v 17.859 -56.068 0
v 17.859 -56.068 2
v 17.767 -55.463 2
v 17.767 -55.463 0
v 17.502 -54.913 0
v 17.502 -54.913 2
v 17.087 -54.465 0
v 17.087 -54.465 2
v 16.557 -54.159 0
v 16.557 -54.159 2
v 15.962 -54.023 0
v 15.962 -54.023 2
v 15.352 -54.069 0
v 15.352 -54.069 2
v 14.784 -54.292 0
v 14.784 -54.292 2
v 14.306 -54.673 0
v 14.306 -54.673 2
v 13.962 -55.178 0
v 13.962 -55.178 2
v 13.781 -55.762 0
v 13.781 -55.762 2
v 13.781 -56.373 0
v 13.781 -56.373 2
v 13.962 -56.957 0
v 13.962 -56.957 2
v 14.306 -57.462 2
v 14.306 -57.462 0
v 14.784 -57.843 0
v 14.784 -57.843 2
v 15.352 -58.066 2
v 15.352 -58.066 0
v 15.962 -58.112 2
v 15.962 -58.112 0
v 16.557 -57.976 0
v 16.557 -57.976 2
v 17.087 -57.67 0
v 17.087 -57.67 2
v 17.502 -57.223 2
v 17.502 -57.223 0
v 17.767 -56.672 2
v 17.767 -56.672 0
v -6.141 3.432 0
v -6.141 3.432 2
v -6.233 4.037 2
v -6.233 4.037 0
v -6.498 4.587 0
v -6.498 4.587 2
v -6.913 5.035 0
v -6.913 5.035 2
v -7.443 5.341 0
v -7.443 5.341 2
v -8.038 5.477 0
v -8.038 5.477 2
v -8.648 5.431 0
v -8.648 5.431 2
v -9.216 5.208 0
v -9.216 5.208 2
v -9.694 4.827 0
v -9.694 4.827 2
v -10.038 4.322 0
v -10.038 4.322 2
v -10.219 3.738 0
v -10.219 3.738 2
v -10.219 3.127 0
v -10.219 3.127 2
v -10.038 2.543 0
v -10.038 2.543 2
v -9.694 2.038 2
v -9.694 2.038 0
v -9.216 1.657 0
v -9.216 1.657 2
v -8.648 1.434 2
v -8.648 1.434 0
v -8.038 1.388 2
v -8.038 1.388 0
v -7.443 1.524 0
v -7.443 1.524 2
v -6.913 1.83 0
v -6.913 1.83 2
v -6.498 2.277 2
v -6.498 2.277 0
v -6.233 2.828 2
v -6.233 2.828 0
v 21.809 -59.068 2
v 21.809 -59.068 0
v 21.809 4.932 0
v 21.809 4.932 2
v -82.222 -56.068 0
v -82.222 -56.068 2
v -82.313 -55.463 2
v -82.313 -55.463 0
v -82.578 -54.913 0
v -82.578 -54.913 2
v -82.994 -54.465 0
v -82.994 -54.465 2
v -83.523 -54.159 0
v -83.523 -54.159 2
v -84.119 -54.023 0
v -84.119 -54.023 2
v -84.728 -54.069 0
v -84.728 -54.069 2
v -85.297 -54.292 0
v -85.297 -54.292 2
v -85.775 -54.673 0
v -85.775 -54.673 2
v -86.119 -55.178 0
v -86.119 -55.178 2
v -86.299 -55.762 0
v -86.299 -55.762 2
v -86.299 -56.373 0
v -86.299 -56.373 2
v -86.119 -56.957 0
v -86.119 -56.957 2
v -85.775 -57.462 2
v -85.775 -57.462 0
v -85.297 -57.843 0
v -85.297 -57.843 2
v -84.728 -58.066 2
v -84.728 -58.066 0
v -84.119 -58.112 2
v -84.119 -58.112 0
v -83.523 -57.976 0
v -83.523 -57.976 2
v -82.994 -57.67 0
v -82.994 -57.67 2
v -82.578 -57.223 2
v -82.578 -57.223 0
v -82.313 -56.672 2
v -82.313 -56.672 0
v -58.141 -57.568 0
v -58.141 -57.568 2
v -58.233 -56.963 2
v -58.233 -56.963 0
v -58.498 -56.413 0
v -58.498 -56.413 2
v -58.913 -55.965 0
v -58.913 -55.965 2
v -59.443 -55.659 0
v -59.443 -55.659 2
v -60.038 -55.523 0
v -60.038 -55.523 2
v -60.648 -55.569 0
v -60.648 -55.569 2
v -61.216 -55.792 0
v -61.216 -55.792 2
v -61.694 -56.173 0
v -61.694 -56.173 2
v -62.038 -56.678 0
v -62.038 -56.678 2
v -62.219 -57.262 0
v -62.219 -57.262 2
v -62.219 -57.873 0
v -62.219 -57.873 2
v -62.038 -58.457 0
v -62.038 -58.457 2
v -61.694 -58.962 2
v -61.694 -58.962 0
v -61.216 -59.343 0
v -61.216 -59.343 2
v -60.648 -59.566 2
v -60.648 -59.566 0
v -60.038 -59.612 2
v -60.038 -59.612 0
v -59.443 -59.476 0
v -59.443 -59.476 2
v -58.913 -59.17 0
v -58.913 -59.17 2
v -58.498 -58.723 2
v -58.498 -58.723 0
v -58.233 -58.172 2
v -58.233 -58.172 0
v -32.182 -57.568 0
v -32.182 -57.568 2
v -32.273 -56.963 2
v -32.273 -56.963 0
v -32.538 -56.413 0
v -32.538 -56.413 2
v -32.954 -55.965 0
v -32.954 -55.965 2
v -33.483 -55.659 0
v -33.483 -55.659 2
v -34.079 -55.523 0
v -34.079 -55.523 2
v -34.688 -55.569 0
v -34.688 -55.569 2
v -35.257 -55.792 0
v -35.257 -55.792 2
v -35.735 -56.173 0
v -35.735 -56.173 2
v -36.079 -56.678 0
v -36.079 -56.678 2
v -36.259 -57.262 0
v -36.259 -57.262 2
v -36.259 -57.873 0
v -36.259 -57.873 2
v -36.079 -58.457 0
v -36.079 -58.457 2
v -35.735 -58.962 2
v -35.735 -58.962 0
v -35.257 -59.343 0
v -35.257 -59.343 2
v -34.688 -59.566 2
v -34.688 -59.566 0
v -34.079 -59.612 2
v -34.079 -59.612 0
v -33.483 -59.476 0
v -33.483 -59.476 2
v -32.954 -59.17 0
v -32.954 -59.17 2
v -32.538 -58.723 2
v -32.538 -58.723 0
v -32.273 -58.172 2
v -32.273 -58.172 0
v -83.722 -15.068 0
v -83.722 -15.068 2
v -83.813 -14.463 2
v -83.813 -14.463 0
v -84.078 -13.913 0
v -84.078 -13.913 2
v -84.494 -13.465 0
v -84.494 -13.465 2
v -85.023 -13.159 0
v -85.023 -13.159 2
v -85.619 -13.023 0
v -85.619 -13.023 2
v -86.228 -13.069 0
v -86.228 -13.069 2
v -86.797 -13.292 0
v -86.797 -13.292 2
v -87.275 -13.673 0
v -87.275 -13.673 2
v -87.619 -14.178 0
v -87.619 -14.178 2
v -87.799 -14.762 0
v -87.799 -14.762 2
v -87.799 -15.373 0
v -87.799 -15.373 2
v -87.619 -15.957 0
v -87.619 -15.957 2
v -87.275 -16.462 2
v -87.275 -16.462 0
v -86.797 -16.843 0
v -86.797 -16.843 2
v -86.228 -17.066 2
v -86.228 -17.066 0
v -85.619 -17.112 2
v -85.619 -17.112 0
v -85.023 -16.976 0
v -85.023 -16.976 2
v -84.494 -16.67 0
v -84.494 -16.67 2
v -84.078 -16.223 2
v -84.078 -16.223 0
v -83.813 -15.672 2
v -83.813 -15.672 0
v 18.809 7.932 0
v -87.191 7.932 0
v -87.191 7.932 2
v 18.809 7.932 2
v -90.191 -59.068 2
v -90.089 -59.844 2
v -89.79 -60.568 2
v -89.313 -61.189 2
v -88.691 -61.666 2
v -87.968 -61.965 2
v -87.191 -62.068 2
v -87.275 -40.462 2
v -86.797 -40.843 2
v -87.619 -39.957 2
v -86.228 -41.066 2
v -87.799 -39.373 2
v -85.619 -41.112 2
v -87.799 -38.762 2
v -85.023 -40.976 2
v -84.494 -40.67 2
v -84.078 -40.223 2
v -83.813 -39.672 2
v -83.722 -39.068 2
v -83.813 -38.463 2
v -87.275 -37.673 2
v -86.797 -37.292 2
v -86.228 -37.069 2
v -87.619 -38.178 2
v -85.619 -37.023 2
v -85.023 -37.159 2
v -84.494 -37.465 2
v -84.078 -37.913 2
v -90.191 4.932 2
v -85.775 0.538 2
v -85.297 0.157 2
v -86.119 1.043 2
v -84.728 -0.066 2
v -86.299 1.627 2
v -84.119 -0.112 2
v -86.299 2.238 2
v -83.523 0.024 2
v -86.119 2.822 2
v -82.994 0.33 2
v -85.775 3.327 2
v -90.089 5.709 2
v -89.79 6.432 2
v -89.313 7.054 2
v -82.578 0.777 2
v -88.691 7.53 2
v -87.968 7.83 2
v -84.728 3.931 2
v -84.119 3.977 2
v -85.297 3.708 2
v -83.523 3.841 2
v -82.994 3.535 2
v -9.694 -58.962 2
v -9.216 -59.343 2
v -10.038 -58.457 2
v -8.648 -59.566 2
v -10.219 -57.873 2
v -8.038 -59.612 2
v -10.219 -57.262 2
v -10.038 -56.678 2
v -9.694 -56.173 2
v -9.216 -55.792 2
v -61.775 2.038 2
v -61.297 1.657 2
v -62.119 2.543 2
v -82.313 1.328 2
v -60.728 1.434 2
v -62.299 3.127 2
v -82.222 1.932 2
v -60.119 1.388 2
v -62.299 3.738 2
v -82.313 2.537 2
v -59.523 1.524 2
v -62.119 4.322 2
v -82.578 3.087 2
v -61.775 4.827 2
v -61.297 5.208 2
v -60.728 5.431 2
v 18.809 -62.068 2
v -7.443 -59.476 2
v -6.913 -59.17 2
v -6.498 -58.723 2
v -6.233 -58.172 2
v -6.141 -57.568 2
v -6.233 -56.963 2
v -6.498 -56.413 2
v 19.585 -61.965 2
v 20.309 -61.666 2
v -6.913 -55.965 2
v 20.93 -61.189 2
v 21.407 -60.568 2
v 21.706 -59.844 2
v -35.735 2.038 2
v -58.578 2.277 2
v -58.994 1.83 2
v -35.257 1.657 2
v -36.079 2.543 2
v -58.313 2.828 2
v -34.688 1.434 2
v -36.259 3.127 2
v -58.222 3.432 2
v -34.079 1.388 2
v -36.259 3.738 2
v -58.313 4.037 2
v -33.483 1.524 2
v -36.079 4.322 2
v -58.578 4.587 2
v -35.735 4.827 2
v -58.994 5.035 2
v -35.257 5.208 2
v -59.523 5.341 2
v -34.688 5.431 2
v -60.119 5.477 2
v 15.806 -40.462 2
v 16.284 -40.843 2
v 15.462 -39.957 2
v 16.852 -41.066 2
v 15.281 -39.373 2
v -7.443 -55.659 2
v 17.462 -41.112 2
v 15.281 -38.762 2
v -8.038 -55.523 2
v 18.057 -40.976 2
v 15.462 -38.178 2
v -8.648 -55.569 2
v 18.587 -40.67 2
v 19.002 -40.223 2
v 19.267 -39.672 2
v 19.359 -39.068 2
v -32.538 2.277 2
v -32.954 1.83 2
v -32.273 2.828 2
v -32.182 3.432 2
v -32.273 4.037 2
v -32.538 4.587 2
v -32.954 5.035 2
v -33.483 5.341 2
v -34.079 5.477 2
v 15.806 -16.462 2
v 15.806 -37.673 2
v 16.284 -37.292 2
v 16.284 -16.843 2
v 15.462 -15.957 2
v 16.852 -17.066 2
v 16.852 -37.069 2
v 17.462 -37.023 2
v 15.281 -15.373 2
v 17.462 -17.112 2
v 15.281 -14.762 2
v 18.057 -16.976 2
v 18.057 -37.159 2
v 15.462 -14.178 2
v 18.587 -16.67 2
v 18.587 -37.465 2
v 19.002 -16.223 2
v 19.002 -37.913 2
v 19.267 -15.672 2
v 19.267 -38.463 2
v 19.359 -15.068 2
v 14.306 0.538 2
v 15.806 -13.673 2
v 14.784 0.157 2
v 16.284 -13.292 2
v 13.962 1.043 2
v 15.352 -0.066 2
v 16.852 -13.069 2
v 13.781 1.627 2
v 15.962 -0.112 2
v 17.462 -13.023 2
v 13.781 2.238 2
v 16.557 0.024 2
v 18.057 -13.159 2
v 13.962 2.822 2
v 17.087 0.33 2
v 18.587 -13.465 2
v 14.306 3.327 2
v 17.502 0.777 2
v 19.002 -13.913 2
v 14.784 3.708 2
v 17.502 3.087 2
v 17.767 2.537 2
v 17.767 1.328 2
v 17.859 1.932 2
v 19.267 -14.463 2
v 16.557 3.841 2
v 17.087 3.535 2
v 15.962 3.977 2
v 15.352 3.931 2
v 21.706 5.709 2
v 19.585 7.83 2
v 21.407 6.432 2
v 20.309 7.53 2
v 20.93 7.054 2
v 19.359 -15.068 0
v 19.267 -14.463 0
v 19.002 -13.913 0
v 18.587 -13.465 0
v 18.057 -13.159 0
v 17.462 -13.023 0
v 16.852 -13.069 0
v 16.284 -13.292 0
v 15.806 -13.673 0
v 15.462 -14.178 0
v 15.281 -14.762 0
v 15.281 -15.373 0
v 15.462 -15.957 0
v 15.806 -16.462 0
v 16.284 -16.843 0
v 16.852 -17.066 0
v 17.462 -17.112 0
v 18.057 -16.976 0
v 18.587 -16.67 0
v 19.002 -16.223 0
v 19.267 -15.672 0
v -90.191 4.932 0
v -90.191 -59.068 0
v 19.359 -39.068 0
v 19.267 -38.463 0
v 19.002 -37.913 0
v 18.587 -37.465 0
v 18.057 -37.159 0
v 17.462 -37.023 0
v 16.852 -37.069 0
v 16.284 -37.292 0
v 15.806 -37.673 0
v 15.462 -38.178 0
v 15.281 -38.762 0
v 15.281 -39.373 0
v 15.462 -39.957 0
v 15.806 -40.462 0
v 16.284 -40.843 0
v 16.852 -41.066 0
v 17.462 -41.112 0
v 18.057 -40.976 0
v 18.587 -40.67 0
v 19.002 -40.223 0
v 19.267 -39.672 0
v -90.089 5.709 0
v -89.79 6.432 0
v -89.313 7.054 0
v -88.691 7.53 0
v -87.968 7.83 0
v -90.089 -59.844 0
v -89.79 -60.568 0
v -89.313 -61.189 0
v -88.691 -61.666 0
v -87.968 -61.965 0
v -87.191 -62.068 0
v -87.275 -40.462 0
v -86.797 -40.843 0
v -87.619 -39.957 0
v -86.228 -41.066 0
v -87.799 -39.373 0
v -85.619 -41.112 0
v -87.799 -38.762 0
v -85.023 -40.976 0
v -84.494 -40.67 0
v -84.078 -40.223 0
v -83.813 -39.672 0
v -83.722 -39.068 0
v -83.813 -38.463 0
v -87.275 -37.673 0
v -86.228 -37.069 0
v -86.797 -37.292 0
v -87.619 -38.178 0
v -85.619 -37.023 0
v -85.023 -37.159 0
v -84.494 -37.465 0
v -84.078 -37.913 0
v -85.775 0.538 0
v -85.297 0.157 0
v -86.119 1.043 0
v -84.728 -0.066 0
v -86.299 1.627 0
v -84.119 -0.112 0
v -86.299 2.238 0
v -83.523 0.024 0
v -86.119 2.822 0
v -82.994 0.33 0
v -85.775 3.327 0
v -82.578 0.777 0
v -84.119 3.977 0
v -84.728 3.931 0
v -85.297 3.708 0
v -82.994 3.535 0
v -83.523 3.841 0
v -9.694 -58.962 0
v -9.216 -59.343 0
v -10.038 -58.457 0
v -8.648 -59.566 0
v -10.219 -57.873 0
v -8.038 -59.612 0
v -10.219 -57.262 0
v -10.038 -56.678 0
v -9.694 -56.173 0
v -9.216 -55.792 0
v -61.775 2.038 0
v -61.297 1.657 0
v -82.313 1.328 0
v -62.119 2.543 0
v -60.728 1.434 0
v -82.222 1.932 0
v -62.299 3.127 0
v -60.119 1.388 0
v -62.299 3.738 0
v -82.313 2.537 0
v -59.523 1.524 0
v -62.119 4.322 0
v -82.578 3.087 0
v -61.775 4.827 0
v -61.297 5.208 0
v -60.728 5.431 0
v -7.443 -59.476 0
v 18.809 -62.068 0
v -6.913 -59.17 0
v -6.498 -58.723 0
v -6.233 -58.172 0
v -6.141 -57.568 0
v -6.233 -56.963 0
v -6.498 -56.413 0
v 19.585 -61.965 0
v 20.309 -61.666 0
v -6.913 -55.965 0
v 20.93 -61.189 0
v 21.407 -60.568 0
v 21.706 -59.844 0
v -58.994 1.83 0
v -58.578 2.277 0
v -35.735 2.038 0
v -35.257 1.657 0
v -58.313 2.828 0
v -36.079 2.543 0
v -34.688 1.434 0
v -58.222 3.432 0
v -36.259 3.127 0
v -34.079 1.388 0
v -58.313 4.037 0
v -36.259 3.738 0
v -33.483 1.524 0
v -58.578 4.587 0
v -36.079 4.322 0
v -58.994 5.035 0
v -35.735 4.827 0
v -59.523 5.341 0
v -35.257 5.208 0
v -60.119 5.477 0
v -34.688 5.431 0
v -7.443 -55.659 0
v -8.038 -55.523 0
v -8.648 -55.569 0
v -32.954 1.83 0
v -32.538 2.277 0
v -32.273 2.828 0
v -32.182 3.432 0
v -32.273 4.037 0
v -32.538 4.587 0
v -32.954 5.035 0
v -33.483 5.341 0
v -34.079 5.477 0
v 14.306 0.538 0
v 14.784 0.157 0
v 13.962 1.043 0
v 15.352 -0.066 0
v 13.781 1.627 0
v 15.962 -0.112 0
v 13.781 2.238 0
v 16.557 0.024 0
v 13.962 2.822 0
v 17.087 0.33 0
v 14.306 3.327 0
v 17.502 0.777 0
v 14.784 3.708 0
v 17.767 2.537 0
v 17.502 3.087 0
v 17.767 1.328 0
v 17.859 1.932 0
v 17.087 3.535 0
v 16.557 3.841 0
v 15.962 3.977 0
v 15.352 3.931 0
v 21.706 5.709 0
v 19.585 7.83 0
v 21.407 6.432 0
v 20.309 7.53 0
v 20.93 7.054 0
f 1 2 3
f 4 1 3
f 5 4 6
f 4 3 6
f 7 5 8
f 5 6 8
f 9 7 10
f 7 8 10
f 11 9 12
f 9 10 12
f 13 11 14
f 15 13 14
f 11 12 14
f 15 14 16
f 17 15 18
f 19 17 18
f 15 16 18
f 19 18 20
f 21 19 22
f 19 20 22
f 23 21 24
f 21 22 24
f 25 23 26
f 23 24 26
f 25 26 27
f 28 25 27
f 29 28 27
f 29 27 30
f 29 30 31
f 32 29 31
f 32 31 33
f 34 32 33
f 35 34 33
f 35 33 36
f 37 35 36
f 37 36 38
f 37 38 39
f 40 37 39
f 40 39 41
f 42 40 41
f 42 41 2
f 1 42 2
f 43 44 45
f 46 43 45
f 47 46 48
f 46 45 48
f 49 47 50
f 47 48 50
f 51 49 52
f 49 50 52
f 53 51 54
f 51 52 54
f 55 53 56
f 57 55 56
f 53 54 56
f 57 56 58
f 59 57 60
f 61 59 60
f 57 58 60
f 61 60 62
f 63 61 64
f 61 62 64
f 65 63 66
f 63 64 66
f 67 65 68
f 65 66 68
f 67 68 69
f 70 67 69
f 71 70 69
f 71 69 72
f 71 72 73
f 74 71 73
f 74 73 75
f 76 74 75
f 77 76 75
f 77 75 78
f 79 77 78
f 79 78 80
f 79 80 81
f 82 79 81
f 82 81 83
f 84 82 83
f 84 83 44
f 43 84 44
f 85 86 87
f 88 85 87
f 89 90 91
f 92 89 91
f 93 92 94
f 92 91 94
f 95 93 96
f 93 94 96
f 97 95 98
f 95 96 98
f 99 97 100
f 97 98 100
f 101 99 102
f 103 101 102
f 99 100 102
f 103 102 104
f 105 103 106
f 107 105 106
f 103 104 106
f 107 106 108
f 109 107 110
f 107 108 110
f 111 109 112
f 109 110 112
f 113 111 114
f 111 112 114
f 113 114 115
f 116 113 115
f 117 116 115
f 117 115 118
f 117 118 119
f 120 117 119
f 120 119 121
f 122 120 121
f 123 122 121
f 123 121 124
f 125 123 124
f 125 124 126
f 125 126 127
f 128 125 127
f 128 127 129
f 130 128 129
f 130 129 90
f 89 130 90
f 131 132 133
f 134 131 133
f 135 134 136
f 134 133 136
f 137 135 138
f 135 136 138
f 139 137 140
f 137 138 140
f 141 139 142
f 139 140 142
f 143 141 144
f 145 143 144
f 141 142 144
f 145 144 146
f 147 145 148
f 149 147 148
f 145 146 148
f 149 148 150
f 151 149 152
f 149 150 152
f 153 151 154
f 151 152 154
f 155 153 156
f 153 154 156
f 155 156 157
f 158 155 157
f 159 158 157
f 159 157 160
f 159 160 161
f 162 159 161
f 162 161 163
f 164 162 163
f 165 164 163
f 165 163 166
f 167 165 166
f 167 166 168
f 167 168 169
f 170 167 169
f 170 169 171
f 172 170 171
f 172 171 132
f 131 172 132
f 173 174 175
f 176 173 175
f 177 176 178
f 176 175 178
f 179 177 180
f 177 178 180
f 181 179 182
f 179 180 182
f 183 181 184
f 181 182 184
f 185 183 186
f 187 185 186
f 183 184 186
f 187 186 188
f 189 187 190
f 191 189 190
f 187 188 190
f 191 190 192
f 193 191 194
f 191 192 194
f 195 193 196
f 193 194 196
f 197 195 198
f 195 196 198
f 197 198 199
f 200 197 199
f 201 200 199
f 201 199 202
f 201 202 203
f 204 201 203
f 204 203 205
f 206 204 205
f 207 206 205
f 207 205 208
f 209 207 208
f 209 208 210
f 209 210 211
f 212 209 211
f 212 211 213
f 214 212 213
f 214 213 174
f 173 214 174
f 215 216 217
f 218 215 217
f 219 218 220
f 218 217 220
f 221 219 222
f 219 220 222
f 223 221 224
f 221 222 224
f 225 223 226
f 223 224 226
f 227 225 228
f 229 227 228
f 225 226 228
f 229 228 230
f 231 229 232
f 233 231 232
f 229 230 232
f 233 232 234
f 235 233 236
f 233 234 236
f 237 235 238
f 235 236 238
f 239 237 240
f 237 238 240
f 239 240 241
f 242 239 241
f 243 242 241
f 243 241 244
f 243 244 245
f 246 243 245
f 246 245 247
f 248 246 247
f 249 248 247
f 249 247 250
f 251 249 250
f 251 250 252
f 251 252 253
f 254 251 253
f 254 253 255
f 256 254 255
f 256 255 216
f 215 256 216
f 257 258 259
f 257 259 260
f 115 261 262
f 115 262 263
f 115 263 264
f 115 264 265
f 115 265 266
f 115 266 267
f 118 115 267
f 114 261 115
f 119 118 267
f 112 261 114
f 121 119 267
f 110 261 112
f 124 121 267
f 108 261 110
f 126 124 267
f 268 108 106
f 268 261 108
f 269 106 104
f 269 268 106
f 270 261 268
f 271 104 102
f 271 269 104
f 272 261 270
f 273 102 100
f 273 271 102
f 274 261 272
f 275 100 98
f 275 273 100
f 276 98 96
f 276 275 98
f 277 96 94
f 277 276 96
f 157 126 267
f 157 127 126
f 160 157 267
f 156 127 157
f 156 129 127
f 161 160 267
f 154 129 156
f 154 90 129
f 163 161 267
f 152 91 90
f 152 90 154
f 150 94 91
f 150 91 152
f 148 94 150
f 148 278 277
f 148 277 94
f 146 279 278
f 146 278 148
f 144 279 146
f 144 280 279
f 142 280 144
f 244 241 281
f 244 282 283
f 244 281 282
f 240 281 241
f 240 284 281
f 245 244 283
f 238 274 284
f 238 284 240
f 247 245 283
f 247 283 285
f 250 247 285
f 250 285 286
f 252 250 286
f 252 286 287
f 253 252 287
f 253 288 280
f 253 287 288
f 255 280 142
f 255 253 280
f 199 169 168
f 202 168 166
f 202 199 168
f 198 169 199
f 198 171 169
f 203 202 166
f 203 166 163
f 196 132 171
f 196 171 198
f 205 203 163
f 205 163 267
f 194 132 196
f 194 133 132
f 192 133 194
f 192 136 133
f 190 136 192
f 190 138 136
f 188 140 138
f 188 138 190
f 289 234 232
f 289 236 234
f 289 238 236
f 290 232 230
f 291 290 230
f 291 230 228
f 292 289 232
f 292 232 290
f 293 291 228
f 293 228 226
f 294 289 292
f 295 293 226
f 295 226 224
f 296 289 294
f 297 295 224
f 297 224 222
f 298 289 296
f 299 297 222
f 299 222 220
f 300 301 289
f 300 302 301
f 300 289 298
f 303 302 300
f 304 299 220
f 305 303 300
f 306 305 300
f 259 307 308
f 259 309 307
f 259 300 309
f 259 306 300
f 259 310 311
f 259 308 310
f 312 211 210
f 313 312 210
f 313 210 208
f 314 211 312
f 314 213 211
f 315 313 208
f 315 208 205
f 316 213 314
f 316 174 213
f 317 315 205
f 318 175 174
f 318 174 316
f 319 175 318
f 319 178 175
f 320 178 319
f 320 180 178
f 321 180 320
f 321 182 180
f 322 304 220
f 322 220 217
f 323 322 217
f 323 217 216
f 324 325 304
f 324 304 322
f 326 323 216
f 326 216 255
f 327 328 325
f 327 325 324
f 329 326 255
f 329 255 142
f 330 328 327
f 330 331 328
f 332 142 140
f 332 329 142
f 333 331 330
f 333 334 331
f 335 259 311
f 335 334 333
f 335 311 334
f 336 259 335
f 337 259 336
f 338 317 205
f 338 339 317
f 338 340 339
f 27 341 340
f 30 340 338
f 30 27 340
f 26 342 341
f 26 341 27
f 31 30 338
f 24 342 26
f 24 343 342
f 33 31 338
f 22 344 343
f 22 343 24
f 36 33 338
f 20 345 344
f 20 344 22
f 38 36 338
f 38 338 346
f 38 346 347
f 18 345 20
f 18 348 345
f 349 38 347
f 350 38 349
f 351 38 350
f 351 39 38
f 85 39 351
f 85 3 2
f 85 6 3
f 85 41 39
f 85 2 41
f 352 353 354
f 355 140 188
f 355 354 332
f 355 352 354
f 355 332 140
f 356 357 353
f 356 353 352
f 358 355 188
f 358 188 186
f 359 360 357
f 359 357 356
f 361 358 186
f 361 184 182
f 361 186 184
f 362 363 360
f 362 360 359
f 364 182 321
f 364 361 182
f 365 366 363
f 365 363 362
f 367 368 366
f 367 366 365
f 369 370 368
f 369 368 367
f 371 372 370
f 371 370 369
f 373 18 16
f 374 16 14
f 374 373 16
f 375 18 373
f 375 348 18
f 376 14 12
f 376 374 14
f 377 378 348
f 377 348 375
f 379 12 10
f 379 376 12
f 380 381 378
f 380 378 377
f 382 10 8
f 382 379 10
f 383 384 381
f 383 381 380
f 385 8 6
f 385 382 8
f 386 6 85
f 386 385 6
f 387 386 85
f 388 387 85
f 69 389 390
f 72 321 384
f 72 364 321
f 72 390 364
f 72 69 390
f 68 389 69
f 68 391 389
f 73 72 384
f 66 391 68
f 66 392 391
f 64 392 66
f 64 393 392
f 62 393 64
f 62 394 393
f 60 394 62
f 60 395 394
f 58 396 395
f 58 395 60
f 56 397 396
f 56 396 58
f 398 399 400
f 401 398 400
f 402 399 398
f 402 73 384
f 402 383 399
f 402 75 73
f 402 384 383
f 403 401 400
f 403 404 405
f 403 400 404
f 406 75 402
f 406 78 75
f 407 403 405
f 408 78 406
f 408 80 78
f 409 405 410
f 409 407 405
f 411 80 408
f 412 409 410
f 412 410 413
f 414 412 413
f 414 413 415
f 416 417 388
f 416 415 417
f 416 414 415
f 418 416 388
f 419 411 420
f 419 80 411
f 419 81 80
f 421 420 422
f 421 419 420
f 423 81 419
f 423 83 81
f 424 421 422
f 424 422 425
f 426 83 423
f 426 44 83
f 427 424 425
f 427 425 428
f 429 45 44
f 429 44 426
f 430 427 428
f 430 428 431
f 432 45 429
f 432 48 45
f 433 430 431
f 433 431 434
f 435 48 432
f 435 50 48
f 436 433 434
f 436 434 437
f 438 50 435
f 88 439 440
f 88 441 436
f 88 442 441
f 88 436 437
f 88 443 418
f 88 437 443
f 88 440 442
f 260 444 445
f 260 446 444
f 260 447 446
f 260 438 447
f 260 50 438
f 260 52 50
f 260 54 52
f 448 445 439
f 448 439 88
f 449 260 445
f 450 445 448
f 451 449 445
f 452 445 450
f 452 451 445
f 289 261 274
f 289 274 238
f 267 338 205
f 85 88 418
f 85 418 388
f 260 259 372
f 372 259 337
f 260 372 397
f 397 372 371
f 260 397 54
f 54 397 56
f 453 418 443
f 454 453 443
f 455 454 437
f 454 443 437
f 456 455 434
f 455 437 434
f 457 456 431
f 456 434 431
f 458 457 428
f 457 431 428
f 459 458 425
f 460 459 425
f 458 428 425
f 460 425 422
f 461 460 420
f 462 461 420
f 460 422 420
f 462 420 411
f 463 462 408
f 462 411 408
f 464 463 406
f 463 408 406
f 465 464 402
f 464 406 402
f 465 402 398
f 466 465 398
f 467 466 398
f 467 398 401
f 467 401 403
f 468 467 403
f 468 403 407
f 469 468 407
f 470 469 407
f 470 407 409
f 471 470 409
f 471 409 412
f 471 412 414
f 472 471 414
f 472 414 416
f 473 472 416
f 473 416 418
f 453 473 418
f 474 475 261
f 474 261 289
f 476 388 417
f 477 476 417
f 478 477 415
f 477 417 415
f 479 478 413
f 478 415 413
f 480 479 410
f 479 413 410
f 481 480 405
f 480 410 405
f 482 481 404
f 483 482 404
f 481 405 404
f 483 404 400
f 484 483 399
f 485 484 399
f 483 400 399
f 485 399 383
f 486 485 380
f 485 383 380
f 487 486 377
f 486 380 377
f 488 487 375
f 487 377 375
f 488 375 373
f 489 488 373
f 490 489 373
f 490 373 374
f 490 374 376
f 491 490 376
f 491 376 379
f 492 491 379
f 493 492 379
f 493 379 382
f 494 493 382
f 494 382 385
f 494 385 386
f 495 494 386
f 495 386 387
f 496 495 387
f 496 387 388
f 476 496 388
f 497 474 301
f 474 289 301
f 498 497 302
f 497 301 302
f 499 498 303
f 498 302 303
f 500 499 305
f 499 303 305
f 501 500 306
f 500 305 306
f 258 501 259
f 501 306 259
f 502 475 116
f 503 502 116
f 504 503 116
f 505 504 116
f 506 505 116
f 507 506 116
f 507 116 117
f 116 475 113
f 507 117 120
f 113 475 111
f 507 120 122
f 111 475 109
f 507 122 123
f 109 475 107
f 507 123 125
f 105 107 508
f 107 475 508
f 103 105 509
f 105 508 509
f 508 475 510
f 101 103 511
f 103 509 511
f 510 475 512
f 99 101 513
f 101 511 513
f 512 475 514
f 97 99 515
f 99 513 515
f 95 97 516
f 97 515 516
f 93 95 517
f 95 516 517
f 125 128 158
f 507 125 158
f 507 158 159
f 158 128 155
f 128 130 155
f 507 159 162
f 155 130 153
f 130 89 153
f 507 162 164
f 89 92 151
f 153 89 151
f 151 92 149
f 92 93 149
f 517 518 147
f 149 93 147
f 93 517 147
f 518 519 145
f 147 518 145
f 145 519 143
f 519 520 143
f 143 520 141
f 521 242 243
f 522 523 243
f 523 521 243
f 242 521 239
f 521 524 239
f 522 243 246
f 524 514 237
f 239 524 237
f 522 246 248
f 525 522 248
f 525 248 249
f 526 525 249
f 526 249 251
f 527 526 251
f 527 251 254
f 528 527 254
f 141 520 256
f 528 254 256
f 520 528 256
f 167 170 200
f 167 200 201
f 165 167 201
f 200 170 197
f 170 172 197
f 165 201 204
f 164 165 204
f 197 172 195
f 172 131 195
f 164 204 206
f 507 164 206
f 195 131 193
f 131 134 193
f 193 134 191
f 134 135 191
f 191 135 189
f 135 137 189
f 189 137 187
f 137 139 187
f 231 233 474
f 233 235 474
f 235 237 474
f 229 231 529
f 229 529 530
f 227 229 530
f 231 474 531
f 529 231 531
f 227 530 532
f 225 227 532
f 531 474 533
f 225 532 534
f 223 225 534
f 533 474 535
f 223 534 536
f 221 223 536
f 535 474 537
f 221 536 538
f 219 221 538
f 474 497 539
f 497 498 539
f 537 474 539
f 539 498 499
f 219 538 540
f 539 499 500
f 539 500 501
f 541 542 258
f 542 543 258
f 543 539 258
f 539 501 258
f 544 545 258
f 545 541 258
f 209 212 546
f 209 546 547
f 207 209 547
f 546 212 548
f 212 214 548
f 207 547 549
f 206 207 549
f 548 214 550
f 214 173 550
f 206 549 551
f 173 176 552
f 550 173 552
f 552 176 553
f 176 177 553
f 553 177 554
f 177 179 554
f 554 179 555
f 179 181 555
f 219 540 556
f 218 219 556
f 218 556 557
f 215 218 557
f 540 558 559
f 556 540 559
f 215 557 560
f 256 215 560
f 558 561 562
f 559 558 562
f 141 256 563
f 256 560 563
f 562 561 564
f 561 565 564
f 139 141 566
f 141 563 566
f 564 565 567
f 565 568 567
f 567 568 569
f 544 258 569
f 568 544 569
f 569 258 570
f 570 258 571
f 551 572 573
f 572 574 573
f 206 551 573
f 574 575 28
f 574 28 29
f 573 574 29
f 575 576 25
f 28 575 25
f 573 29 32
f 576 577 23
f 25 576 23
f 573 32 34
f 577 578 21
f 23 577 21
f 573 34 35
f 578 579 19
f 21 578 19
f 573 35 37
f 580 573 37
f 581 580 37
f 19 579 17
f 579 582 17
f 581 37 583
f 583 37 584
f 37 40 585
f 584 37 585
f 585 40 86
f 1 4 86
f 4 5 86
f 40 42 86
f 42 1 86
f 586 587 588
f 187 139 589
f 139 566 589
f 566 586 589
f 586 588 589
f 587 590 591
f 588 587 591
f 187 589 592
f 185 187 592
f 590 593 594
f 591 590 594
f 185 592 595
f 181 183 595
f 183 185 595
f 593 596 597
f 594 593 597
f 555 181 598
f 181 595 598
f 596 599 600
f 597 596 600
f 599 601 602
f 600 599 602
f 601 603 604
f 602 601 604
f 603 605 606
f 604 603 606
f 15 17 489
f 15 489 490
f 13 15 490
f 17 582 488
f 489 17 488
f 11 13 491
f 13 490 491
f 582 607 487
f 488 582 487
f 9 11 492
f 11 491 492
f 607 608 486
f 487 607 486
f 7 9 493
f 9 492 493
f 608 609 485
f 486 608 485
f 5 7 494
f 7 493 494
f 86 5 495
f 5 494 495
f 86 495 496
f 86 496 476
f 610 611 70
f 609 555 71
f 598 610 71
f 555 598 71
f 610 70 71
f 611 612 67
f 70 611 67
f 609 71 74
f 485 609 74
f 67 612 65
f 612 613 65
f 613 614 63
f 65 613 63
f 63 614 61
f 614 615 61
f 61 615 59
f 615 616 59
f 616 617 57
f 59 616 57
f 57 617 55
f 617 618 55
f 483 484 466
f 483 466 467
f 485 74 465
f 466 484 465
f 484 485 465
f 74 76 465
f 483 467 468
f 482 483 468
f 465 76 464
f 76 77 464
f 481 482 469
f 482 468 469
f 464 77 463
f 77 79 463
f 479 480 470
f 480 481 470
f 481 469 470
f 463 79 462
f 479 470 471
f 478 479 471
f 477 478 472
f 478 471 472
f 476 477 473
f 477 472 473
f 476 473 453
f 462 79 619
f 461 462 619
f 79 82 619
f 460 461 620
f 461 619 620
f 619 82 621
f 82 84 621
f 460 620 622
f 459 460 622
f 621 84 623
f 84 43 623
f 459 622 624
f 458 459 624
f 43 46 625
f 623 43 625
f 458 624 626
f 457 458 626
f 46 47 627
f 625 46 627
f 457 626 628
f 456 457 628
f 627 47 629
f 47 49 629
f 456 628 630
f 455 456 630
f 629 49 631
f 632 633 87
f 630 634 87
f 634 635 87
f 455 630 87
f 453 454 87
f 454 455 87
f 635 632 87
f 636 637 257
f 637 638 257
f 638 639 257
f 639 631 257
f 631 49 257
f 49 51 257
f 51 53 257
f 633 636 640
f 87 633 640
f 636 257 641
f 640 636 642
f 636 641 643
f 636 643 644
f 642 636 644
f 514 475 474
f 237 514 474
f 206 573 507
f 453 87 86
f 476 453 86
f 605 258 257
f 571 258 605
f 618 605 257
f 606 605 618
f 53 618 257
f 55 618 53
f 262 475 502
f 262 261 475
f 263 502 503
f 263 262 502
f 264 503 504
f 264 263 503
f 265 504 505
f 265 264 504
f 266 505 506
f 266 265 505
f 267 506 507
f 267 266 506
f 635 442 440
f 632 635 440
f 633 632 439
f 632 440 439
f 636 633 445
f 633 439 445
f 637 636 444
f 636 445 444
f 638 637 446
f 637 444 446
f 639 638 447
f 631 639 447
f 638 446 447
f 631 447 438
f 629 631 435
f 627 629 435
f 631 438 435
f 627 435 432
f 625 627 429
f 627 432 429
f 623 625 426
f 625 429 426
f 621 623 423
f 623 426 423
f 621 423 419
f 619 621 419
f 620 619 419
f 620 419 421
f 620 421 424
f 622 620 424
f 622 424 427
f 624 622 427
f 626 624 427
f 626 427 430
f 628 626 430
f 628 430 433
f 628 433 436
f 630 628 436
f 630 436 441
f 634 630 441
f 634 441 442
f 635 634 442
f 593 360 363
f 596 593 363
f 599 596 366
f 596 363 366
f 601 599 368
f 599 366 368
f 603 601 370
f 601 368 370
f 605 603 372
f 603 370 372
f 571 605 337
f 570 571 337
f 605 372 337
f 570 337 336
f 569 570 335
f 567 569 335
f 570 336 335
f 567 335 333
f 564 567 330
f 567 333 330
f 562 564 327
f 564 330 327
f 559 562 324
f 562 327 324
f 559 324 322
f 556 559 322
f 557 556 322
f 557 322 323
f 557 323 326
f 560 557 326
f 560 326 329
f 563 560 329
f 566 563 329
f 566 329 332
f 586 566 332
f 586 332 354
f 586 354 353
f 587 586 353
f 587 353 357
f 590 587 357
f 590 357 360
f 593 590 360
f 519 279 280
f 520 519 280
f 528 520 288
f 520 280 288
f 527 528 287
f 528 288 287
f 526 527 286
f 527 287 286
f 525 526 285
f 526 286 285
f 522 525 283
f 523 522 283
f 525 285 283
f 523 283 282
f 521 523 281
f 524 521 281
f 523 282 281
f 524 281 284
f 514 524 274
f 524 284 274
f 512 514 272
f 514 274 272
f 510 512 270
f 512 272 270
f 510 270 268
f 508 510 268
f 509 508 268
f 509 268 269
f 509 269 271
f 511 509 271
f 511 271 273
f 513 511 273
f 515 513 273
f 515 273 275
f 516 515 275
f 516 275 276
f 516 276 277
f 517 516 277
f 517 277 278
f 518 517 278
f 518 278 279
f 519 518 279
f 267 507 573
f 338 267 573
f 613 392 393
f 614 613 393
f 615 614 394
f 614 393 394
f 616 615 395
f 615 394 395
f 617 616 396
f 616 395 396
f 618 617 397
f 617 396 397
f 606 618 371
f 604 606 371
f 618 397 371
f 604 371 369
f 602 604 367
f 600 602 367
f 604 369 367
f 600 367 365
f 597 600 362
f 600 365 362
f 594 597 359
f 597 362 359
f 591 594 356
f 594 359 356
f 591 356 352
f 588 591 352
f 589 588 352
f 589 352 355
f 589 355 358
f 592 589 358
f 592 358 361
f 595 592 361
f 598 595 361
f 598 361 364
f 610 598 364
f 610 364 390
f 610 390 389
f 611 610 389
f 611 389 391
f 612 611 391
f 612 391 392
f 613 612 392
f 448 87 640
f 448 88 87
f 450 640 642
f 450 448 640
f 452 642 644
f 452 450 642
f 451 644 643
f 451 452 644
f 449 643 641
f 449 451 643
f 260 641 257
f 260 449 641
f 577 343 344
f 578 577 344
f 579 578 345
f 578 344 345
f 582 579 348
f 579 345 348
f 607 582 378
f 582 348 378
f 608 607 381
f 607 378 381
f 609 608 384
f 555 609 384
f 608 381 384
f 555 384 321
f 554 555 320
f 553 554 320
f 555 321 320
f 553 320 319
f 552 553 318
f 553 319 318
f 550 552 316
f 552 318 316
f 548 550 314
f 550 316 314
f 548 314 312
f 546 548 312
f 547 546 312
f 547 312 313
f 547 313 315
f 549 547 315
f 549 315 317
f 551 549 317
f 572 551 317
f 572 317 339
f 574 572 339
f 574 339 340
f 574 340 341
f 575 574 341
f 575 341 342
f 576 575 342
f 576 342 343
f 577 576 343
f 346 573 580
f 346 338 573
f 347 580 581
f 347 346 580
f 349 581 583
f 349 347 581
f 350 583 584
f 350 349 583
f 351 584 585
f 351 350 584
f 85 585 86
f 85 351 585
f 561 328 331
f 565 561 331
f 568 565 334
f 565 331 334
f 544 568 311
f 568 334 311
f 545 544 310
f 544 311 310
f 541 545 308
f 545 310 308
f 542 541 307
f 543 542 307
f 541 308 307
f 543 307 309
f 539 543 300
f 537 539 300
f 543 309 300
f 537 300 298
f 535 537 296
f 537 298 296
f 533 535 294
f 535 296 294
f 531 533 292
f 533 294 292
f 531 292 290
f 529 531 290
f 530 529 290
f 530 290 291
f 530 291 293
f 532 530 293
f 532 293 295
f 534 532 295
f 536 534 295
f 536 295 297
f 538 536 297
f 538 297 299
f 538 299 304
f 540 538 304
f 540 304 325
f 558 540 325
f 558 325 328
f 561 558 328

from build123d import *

# Parameters (mm, degrees)
SKETCH1_W           = 112
SKETCH1_H           = 70
BOSS_EXTRUDE1_DEPTH = 2
FILLET1_R           = 3
SKETCH2_R           = 2.05
CUT_EXTRUDE1_DEPTH  = 3


with BuildPart() as part:
    # Sketch1 → Boss-Extrude1 (new body)
    with BuildSketch(Plane.XY):
        with Locations((-34.191460674, -27.067695099)):
            Rectangle(SKETCH1_W, SKETCH1_H)
    extrude(amount=BOSS_EXTRUDE1_DEPTH)

    # Fillet1
    fillet1_edges = [part.edges().sort_by_distance(p)[0] for p in [
        (-90.191460674, 7.932304901, 1),
        (21.808539326, 7.932304901, 1),
        (21.808539326, -62.067695099, 1),
        (-90.191460674, -62.067695099, 1),
    ]]
    fillet(fillet1_edges, radius=FILLET1_R)

    # Sketch2 → Cut-Extrude1 (cut)
    with BuildSketch(Plane.XY.offset(2)):
        with Locations((-84.272277823, -56.067695099)):
            Circle(SKETCH2_R)
        with Locations((-85.772277823, -39.067695099)):
            Circle(SKETCH2_R)
        with Locations((-85.772277823, -15.067695099)):
            Circle(SKETCH2_R)
        with Locations((-84.272277823, 1.932304901)):
            Circle(SKETCH2_R)
        with Locations((-60.272277823, 3.432304901)):
            Circle(SKETCH2_R)
        with Locations((-60.191460674, -57.567695099)):
            Circle(SKETCH2_R)
        with Locations((-34.231869249, -57.567695099)):
            Circle(SKETCH2_R)
        with Locations((-34.231869249, 3.432304901)):
            Circle(SKETCH2_R)
        with Locations((-8.191460674, 3.432304901)):
            Circle(SKETCH2_R)
        with Locations((-8.191460674, -57.567695099)):
            Circle(SKETCH2_R)
        with Locations((15.808539326, -56.067695099)):
            Circle(SKETCH2_R)
        with Locations((17.308539326, -39.067695099)):
            Circle(SKETCH2_R)
        with Locations((17.308539326, -15.067695099)):
            Circle(SKETCH2_R)
        with Locations((15.808539326, 1.932304901)):
            Circle(SKETCH2_R)
    extrude(amount=-CUT_EXTRUDE1_DEPTH, mode=Mode.SUBTRACT)


solid = part.part
